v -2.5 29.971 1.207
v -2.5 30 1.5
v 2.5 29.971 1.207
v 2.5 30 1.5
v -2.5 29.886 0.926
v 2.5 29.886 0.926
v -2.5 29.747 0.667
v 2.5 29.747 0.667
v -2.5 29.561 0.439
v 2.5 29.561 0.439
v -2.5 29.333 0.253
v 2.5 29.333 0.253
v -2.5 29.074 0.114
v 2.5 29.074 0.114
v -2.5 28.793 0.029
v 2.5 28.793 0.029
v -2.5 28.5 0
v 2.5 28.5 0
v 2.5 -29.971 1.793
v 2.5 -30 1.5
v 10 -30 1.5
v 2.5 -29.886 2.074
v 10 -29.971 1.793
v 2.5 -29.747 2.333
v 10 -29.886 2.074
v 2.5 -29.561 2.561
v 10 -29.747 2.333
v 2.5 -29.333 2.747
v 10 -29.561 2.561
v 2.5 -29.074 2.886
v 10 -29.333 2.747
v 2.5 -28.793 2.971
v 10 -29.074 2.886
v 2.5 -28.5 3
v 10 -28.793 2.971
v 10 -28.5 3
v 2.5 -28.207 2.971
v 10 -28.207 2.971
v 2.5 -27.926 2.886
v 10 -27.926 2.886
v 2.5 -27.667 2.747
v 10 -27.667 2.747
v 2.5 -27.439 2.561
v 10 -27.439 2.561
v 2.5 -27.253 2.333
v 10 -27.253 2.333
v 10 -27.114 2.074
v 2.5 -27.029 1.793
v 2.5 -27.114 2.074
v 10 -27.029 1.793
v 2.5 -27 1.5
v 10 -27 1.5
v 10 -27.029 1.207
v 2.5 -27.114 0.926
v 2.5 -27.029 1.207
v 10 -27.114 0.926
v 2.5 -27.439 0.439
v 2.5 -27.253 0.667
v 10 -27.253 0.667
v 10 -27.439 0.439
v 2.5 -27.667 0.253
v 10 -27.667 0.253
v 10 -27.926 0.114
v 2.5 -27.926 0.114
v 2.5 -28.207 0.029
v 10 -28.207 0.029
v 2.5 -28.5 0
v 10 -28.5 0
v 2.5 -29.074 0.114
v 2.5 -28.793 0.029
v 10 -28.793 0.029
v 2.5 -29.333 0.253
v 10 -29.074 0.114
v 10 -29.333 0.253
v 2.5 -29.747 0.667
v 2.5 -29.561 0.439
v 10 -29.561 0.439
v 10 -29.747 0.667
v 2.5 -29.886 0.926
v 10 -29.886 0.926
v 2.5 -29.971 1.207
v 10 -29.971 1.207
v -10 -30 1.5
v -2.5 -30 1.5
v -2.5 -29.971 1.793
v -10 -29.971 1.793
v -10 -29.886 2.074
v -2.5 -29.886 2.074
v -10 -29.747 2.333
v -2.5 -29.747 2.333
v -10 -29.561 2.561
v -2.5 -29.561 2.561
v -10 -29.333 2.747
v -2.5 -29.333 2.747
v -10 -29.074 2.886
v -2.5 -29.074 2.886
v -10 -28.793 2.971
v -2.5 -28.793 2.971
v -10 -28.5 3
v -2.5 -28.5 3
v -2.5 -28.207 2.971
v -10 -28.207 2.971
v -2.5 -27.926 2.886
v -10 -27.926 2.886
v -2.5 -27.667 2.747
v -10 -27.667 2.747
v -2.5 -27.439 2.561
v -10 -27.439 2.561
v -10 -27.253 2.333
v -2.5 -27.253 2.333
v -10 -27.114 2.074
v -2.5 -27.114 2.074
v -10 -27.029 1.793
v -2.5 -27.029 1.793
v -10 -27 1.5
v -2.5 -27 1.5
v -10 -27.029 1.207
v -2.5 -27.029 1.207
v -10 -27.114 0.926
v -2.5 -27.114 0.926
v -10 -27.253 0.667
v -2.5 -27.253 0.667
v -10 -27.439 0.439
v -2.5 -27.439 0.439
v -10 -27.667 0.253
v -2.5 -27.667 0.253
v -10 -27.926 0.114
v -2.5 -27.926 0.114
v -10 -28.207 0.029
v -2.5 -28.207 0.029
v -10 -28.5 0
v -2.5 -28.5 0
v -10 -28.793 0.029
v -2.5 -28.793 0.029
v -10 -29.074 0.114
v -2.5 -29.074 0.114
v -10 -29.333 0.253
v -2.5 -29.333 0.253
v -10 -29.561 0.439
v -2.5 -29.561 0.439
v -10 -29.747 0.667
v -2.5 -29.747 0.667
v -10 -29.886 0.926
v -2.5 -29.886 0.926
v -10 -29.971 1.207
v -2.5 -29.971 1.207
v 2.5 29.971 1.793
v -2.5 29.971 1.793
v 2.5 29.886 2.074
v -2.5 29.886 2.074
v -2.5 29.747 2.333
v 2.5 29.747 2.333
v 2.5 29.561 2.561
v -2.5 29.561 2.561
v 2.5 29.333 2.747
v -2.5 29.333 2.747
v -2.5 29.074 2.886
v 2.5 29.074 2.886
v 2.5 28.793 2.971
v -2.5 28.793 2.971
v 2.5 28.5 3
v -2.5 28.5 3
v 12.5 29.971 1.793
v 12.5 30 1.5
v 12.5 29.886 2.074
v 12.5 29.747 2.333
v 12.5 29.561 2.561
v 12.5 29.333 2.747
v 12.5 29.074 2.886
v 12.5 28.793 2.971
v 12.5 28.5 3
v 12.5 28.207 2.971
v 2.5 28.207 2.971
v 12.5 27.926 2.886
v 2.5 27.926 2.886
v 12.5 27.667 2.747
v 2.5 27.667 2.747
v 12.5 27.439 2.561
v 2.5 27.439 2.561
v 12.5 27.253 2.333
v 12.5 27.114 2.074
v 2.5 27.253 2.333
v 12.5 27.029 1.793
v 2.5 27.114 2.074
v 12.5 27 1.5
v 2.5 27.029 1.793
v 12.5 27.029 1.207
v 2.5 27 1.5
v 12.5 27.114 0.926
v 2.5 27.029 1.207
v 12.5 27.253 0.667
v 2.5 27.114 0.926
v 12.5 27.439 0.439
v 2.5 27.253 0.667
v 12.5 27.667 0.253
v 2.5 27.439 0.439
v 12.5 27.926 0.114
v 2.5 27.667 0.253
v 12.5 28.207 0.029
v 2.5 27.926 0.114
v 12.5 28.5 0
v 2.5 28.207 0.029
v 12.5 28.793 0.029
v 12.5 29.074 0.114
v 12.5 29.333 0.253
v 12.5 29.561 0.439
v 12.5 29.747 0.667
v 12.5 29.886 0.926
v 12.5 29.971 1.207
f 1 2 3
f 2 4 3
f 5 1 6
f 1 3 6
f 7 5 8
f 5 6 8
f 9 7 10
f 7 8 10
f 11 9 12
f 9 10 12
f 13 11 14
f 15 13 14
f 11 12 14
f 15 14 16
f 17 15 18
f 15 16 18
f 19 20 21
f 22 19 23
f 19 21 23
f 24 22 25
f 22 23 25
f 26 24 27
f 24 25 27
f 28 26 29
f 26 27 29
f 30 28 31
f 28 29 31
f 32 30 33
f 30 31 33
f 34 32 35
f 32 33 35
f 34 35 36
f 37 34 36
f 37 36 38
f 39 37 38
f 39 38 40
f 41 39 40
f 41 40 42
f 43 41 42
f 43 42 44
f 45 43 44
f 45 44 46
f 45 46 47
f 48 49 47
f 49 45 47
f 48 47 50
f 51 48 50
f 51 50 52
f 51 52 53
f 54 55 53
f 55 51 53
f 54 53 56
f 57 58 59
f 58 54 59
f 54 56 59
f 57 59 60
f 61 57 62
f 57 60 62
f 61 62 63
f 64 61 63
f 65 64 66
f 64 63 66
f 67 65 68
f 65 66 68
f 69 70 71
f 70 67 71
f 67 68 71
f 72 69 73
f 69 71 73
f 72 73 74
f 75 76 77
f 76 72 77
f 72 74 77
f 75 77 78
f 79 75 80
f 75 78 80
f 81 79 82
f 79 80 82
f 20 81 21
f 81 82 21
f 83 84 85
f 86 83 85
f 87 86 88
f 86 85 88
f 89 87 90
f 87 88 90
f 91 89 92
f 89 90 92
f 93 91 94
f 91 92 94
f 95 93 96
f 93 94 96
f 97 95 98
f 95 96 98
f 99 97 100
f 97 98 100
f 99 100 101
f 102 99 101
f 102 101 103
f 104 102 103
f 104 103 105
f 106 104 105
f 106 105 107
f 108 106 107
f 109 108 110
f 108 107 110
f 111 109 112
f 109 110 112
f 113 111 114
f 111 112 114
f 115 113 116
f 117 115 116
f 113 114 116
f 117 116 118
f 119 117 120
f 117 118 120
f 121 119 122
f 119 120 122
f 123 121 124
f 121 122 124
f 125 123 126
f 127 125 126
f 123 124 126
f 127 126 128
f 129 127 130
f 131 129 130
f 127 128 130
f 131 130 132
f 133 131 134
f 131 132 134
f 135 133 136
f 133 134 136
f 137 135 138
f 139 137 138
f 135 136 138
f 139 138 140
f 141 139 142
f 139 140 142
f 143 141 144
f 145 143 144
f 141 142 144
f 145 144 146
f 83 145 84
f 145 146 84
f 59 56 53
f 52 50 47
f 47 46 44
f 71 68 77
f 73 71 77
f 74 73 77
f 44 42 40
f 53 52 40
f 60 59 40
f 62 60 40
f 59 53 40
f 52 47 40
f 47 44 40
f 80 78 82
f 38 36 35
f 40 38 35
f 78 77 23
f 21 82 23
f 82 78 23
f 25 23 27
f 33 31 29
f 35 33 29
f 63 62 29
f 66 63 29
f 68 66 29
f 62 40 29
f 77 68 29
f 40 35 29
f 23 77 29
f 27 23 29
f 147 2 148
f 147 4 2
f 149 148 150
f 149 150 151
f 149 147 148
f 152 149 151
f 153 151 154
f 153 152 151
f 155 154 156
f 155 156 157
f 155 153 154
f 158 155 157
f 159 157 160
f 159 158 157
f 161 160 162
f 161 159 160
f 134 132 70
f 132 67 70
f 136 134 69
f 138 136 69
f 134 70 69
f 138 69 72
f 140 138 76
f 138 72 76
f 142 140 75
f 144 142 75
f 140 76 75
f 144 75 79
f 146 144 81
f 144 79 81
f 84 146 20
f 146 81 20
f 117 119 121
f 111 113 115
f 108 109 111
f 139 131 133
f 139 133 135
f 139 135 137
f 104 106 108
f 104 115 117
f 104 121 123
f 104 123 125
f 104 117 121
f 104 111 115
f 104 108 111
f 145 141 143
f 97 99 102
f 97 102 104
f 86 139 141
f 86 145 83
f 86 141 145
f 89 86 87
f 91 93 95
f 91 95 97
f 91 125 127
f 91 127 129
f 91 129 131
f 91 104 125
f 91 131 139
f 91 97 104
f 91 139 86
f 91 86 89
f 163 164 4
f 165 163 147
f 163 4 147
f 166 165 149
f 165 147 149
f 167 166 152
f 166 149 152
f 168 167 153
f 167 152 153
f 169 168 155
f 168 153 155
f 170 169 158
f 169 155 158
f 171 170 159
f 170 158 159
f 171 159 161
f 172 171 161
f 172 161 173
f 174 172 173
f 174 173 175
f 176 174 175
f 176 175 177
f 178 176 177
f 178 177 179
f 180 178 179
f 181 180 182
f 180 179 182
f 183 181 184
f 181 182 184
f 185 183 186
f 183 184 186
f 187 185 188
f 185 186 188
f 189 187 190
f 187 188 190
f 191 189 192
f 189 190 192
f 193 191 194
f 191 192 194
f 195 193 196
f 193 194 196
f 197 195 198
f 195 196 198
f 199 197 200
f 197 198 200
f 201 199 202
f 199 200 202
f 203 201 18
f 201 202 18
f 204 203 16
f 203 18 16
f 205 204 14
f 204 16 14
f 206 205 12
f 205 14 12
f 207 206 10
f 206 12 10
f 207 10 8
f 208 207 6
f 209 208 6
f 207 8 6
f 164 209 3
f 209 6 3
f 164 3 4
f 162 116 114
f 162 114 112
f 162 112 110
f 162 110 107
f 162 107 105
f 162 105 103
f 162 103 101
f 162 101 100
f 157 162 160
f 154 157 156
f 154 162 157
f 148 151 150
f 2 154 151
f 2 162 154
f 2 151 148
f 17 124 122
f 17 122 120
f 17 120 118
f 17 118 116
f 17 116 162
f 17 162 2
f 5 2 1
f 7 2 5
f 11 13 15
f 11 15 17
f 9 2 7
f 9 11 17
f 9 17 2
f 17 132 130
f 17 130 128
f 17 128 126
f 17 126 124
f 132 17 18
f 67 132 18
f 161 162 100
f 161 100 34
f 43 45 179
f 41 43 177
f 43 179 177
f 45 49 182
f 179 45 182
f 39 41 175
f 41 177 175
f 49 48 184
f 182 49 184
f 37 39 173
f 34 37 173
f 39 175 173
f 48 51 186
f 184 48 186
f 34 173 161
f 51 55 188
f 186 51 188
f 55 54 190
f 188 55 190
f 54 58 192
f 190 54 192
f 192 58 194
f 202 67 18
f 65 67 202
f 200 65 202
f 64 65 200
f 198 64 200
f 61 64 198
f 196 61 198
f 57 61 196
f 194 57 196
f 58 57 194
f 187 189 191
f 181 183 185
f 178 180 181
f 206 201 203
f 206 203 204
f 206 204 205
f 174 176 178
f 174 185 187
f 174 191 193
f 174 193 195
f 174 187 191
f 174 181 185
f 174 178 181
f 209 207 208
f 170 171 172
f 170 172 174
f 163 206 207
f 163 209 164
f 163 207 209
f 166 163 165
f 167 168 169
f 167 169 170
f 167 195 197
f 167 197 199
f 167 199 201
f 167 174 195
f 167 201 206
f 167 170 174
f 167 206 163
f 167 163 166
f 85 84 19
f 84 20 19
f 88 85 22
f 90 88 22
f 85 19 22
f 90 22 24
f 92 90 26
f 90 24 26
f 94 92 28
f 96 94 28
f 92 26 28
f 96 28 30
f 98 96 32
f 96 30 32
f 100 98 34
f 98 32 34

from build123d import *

# Parameters (mm, degrees)
SKETCH1_W                = 5
SKETCH1_H                = 60
BOSS_EXTRUDE1_DEPTH      = 3
SKETCH2_R                = 1.5
BOSS_EXTRUDE2_DEPTH      = 10
FILLET1_R                = 1.5
BOSS_EXTRUDE3_DEPTH      = 10
BOSS_EXTRUDE3_DEPTH_BACK = 10
SKETCH3_R                = 1.5
FILLET2_R                = 1.5


with BuildPart() as part:
    # Sketch1 → Boss-Extrude1 (new body)
    with BuildSketch(Plane.XY):
        Rectangle(SKETCH1_W, SKETCH1_H)
    extrude(amount=BOSS_EXTRUDE1_DEPTH)

    # Sketch2 → Boss-Extrude2 (add)
    with BuildSketch(Plane(origin=(2.5, 0, 0), x_dir=(0, 0, -1), z_dir=(1, 0, 0))):
        with Locations(Location((-1.5, 28.5, 0), (0, 0, 90))):
            Circle(SKETCH2_R)
    extrude(amount=BOSS_EXTRUDE2_DEPTH)

    # Fillet1
    fillet1_edges = [part.edges().sort_by_distance(p)[0] for p in [
        (0, 30, 3),
        (0, 30, 0),
    ]]
    fillet(fillet1_edges, radius=FILLET1_R - 0.0001)  # a hair under: the kernel refuses the full size

    # Sketch3 → Boss-Extrude3 (add, two sides: drawn at the far end of the back side and taken through both)
    with BuildSketch(Plane.ZY.offset(-BOSS_EXTRUDE3_DEPTH_BACK)):
        with Locations(Location((1.5, -28.5, 0), (0, 0, 270))):
            Circle(SKETCH3_R)
    extrude(amount=BOSS_EXTRUDE3_DEPTH + BOSS_EXTRUDE3_DEPTH_BACK)

    # Fillet2
    fillet2_edges = [part.edges().sort_by_distance(p)[0] for p in [
        (0, -30, 3),
        (0, -30, 0),
    ]]
    fillet(fillet2_edges, radius=FILLET2_R - 0.0001)  # a hair under: the kernel refuses the full size


solid = part.part
